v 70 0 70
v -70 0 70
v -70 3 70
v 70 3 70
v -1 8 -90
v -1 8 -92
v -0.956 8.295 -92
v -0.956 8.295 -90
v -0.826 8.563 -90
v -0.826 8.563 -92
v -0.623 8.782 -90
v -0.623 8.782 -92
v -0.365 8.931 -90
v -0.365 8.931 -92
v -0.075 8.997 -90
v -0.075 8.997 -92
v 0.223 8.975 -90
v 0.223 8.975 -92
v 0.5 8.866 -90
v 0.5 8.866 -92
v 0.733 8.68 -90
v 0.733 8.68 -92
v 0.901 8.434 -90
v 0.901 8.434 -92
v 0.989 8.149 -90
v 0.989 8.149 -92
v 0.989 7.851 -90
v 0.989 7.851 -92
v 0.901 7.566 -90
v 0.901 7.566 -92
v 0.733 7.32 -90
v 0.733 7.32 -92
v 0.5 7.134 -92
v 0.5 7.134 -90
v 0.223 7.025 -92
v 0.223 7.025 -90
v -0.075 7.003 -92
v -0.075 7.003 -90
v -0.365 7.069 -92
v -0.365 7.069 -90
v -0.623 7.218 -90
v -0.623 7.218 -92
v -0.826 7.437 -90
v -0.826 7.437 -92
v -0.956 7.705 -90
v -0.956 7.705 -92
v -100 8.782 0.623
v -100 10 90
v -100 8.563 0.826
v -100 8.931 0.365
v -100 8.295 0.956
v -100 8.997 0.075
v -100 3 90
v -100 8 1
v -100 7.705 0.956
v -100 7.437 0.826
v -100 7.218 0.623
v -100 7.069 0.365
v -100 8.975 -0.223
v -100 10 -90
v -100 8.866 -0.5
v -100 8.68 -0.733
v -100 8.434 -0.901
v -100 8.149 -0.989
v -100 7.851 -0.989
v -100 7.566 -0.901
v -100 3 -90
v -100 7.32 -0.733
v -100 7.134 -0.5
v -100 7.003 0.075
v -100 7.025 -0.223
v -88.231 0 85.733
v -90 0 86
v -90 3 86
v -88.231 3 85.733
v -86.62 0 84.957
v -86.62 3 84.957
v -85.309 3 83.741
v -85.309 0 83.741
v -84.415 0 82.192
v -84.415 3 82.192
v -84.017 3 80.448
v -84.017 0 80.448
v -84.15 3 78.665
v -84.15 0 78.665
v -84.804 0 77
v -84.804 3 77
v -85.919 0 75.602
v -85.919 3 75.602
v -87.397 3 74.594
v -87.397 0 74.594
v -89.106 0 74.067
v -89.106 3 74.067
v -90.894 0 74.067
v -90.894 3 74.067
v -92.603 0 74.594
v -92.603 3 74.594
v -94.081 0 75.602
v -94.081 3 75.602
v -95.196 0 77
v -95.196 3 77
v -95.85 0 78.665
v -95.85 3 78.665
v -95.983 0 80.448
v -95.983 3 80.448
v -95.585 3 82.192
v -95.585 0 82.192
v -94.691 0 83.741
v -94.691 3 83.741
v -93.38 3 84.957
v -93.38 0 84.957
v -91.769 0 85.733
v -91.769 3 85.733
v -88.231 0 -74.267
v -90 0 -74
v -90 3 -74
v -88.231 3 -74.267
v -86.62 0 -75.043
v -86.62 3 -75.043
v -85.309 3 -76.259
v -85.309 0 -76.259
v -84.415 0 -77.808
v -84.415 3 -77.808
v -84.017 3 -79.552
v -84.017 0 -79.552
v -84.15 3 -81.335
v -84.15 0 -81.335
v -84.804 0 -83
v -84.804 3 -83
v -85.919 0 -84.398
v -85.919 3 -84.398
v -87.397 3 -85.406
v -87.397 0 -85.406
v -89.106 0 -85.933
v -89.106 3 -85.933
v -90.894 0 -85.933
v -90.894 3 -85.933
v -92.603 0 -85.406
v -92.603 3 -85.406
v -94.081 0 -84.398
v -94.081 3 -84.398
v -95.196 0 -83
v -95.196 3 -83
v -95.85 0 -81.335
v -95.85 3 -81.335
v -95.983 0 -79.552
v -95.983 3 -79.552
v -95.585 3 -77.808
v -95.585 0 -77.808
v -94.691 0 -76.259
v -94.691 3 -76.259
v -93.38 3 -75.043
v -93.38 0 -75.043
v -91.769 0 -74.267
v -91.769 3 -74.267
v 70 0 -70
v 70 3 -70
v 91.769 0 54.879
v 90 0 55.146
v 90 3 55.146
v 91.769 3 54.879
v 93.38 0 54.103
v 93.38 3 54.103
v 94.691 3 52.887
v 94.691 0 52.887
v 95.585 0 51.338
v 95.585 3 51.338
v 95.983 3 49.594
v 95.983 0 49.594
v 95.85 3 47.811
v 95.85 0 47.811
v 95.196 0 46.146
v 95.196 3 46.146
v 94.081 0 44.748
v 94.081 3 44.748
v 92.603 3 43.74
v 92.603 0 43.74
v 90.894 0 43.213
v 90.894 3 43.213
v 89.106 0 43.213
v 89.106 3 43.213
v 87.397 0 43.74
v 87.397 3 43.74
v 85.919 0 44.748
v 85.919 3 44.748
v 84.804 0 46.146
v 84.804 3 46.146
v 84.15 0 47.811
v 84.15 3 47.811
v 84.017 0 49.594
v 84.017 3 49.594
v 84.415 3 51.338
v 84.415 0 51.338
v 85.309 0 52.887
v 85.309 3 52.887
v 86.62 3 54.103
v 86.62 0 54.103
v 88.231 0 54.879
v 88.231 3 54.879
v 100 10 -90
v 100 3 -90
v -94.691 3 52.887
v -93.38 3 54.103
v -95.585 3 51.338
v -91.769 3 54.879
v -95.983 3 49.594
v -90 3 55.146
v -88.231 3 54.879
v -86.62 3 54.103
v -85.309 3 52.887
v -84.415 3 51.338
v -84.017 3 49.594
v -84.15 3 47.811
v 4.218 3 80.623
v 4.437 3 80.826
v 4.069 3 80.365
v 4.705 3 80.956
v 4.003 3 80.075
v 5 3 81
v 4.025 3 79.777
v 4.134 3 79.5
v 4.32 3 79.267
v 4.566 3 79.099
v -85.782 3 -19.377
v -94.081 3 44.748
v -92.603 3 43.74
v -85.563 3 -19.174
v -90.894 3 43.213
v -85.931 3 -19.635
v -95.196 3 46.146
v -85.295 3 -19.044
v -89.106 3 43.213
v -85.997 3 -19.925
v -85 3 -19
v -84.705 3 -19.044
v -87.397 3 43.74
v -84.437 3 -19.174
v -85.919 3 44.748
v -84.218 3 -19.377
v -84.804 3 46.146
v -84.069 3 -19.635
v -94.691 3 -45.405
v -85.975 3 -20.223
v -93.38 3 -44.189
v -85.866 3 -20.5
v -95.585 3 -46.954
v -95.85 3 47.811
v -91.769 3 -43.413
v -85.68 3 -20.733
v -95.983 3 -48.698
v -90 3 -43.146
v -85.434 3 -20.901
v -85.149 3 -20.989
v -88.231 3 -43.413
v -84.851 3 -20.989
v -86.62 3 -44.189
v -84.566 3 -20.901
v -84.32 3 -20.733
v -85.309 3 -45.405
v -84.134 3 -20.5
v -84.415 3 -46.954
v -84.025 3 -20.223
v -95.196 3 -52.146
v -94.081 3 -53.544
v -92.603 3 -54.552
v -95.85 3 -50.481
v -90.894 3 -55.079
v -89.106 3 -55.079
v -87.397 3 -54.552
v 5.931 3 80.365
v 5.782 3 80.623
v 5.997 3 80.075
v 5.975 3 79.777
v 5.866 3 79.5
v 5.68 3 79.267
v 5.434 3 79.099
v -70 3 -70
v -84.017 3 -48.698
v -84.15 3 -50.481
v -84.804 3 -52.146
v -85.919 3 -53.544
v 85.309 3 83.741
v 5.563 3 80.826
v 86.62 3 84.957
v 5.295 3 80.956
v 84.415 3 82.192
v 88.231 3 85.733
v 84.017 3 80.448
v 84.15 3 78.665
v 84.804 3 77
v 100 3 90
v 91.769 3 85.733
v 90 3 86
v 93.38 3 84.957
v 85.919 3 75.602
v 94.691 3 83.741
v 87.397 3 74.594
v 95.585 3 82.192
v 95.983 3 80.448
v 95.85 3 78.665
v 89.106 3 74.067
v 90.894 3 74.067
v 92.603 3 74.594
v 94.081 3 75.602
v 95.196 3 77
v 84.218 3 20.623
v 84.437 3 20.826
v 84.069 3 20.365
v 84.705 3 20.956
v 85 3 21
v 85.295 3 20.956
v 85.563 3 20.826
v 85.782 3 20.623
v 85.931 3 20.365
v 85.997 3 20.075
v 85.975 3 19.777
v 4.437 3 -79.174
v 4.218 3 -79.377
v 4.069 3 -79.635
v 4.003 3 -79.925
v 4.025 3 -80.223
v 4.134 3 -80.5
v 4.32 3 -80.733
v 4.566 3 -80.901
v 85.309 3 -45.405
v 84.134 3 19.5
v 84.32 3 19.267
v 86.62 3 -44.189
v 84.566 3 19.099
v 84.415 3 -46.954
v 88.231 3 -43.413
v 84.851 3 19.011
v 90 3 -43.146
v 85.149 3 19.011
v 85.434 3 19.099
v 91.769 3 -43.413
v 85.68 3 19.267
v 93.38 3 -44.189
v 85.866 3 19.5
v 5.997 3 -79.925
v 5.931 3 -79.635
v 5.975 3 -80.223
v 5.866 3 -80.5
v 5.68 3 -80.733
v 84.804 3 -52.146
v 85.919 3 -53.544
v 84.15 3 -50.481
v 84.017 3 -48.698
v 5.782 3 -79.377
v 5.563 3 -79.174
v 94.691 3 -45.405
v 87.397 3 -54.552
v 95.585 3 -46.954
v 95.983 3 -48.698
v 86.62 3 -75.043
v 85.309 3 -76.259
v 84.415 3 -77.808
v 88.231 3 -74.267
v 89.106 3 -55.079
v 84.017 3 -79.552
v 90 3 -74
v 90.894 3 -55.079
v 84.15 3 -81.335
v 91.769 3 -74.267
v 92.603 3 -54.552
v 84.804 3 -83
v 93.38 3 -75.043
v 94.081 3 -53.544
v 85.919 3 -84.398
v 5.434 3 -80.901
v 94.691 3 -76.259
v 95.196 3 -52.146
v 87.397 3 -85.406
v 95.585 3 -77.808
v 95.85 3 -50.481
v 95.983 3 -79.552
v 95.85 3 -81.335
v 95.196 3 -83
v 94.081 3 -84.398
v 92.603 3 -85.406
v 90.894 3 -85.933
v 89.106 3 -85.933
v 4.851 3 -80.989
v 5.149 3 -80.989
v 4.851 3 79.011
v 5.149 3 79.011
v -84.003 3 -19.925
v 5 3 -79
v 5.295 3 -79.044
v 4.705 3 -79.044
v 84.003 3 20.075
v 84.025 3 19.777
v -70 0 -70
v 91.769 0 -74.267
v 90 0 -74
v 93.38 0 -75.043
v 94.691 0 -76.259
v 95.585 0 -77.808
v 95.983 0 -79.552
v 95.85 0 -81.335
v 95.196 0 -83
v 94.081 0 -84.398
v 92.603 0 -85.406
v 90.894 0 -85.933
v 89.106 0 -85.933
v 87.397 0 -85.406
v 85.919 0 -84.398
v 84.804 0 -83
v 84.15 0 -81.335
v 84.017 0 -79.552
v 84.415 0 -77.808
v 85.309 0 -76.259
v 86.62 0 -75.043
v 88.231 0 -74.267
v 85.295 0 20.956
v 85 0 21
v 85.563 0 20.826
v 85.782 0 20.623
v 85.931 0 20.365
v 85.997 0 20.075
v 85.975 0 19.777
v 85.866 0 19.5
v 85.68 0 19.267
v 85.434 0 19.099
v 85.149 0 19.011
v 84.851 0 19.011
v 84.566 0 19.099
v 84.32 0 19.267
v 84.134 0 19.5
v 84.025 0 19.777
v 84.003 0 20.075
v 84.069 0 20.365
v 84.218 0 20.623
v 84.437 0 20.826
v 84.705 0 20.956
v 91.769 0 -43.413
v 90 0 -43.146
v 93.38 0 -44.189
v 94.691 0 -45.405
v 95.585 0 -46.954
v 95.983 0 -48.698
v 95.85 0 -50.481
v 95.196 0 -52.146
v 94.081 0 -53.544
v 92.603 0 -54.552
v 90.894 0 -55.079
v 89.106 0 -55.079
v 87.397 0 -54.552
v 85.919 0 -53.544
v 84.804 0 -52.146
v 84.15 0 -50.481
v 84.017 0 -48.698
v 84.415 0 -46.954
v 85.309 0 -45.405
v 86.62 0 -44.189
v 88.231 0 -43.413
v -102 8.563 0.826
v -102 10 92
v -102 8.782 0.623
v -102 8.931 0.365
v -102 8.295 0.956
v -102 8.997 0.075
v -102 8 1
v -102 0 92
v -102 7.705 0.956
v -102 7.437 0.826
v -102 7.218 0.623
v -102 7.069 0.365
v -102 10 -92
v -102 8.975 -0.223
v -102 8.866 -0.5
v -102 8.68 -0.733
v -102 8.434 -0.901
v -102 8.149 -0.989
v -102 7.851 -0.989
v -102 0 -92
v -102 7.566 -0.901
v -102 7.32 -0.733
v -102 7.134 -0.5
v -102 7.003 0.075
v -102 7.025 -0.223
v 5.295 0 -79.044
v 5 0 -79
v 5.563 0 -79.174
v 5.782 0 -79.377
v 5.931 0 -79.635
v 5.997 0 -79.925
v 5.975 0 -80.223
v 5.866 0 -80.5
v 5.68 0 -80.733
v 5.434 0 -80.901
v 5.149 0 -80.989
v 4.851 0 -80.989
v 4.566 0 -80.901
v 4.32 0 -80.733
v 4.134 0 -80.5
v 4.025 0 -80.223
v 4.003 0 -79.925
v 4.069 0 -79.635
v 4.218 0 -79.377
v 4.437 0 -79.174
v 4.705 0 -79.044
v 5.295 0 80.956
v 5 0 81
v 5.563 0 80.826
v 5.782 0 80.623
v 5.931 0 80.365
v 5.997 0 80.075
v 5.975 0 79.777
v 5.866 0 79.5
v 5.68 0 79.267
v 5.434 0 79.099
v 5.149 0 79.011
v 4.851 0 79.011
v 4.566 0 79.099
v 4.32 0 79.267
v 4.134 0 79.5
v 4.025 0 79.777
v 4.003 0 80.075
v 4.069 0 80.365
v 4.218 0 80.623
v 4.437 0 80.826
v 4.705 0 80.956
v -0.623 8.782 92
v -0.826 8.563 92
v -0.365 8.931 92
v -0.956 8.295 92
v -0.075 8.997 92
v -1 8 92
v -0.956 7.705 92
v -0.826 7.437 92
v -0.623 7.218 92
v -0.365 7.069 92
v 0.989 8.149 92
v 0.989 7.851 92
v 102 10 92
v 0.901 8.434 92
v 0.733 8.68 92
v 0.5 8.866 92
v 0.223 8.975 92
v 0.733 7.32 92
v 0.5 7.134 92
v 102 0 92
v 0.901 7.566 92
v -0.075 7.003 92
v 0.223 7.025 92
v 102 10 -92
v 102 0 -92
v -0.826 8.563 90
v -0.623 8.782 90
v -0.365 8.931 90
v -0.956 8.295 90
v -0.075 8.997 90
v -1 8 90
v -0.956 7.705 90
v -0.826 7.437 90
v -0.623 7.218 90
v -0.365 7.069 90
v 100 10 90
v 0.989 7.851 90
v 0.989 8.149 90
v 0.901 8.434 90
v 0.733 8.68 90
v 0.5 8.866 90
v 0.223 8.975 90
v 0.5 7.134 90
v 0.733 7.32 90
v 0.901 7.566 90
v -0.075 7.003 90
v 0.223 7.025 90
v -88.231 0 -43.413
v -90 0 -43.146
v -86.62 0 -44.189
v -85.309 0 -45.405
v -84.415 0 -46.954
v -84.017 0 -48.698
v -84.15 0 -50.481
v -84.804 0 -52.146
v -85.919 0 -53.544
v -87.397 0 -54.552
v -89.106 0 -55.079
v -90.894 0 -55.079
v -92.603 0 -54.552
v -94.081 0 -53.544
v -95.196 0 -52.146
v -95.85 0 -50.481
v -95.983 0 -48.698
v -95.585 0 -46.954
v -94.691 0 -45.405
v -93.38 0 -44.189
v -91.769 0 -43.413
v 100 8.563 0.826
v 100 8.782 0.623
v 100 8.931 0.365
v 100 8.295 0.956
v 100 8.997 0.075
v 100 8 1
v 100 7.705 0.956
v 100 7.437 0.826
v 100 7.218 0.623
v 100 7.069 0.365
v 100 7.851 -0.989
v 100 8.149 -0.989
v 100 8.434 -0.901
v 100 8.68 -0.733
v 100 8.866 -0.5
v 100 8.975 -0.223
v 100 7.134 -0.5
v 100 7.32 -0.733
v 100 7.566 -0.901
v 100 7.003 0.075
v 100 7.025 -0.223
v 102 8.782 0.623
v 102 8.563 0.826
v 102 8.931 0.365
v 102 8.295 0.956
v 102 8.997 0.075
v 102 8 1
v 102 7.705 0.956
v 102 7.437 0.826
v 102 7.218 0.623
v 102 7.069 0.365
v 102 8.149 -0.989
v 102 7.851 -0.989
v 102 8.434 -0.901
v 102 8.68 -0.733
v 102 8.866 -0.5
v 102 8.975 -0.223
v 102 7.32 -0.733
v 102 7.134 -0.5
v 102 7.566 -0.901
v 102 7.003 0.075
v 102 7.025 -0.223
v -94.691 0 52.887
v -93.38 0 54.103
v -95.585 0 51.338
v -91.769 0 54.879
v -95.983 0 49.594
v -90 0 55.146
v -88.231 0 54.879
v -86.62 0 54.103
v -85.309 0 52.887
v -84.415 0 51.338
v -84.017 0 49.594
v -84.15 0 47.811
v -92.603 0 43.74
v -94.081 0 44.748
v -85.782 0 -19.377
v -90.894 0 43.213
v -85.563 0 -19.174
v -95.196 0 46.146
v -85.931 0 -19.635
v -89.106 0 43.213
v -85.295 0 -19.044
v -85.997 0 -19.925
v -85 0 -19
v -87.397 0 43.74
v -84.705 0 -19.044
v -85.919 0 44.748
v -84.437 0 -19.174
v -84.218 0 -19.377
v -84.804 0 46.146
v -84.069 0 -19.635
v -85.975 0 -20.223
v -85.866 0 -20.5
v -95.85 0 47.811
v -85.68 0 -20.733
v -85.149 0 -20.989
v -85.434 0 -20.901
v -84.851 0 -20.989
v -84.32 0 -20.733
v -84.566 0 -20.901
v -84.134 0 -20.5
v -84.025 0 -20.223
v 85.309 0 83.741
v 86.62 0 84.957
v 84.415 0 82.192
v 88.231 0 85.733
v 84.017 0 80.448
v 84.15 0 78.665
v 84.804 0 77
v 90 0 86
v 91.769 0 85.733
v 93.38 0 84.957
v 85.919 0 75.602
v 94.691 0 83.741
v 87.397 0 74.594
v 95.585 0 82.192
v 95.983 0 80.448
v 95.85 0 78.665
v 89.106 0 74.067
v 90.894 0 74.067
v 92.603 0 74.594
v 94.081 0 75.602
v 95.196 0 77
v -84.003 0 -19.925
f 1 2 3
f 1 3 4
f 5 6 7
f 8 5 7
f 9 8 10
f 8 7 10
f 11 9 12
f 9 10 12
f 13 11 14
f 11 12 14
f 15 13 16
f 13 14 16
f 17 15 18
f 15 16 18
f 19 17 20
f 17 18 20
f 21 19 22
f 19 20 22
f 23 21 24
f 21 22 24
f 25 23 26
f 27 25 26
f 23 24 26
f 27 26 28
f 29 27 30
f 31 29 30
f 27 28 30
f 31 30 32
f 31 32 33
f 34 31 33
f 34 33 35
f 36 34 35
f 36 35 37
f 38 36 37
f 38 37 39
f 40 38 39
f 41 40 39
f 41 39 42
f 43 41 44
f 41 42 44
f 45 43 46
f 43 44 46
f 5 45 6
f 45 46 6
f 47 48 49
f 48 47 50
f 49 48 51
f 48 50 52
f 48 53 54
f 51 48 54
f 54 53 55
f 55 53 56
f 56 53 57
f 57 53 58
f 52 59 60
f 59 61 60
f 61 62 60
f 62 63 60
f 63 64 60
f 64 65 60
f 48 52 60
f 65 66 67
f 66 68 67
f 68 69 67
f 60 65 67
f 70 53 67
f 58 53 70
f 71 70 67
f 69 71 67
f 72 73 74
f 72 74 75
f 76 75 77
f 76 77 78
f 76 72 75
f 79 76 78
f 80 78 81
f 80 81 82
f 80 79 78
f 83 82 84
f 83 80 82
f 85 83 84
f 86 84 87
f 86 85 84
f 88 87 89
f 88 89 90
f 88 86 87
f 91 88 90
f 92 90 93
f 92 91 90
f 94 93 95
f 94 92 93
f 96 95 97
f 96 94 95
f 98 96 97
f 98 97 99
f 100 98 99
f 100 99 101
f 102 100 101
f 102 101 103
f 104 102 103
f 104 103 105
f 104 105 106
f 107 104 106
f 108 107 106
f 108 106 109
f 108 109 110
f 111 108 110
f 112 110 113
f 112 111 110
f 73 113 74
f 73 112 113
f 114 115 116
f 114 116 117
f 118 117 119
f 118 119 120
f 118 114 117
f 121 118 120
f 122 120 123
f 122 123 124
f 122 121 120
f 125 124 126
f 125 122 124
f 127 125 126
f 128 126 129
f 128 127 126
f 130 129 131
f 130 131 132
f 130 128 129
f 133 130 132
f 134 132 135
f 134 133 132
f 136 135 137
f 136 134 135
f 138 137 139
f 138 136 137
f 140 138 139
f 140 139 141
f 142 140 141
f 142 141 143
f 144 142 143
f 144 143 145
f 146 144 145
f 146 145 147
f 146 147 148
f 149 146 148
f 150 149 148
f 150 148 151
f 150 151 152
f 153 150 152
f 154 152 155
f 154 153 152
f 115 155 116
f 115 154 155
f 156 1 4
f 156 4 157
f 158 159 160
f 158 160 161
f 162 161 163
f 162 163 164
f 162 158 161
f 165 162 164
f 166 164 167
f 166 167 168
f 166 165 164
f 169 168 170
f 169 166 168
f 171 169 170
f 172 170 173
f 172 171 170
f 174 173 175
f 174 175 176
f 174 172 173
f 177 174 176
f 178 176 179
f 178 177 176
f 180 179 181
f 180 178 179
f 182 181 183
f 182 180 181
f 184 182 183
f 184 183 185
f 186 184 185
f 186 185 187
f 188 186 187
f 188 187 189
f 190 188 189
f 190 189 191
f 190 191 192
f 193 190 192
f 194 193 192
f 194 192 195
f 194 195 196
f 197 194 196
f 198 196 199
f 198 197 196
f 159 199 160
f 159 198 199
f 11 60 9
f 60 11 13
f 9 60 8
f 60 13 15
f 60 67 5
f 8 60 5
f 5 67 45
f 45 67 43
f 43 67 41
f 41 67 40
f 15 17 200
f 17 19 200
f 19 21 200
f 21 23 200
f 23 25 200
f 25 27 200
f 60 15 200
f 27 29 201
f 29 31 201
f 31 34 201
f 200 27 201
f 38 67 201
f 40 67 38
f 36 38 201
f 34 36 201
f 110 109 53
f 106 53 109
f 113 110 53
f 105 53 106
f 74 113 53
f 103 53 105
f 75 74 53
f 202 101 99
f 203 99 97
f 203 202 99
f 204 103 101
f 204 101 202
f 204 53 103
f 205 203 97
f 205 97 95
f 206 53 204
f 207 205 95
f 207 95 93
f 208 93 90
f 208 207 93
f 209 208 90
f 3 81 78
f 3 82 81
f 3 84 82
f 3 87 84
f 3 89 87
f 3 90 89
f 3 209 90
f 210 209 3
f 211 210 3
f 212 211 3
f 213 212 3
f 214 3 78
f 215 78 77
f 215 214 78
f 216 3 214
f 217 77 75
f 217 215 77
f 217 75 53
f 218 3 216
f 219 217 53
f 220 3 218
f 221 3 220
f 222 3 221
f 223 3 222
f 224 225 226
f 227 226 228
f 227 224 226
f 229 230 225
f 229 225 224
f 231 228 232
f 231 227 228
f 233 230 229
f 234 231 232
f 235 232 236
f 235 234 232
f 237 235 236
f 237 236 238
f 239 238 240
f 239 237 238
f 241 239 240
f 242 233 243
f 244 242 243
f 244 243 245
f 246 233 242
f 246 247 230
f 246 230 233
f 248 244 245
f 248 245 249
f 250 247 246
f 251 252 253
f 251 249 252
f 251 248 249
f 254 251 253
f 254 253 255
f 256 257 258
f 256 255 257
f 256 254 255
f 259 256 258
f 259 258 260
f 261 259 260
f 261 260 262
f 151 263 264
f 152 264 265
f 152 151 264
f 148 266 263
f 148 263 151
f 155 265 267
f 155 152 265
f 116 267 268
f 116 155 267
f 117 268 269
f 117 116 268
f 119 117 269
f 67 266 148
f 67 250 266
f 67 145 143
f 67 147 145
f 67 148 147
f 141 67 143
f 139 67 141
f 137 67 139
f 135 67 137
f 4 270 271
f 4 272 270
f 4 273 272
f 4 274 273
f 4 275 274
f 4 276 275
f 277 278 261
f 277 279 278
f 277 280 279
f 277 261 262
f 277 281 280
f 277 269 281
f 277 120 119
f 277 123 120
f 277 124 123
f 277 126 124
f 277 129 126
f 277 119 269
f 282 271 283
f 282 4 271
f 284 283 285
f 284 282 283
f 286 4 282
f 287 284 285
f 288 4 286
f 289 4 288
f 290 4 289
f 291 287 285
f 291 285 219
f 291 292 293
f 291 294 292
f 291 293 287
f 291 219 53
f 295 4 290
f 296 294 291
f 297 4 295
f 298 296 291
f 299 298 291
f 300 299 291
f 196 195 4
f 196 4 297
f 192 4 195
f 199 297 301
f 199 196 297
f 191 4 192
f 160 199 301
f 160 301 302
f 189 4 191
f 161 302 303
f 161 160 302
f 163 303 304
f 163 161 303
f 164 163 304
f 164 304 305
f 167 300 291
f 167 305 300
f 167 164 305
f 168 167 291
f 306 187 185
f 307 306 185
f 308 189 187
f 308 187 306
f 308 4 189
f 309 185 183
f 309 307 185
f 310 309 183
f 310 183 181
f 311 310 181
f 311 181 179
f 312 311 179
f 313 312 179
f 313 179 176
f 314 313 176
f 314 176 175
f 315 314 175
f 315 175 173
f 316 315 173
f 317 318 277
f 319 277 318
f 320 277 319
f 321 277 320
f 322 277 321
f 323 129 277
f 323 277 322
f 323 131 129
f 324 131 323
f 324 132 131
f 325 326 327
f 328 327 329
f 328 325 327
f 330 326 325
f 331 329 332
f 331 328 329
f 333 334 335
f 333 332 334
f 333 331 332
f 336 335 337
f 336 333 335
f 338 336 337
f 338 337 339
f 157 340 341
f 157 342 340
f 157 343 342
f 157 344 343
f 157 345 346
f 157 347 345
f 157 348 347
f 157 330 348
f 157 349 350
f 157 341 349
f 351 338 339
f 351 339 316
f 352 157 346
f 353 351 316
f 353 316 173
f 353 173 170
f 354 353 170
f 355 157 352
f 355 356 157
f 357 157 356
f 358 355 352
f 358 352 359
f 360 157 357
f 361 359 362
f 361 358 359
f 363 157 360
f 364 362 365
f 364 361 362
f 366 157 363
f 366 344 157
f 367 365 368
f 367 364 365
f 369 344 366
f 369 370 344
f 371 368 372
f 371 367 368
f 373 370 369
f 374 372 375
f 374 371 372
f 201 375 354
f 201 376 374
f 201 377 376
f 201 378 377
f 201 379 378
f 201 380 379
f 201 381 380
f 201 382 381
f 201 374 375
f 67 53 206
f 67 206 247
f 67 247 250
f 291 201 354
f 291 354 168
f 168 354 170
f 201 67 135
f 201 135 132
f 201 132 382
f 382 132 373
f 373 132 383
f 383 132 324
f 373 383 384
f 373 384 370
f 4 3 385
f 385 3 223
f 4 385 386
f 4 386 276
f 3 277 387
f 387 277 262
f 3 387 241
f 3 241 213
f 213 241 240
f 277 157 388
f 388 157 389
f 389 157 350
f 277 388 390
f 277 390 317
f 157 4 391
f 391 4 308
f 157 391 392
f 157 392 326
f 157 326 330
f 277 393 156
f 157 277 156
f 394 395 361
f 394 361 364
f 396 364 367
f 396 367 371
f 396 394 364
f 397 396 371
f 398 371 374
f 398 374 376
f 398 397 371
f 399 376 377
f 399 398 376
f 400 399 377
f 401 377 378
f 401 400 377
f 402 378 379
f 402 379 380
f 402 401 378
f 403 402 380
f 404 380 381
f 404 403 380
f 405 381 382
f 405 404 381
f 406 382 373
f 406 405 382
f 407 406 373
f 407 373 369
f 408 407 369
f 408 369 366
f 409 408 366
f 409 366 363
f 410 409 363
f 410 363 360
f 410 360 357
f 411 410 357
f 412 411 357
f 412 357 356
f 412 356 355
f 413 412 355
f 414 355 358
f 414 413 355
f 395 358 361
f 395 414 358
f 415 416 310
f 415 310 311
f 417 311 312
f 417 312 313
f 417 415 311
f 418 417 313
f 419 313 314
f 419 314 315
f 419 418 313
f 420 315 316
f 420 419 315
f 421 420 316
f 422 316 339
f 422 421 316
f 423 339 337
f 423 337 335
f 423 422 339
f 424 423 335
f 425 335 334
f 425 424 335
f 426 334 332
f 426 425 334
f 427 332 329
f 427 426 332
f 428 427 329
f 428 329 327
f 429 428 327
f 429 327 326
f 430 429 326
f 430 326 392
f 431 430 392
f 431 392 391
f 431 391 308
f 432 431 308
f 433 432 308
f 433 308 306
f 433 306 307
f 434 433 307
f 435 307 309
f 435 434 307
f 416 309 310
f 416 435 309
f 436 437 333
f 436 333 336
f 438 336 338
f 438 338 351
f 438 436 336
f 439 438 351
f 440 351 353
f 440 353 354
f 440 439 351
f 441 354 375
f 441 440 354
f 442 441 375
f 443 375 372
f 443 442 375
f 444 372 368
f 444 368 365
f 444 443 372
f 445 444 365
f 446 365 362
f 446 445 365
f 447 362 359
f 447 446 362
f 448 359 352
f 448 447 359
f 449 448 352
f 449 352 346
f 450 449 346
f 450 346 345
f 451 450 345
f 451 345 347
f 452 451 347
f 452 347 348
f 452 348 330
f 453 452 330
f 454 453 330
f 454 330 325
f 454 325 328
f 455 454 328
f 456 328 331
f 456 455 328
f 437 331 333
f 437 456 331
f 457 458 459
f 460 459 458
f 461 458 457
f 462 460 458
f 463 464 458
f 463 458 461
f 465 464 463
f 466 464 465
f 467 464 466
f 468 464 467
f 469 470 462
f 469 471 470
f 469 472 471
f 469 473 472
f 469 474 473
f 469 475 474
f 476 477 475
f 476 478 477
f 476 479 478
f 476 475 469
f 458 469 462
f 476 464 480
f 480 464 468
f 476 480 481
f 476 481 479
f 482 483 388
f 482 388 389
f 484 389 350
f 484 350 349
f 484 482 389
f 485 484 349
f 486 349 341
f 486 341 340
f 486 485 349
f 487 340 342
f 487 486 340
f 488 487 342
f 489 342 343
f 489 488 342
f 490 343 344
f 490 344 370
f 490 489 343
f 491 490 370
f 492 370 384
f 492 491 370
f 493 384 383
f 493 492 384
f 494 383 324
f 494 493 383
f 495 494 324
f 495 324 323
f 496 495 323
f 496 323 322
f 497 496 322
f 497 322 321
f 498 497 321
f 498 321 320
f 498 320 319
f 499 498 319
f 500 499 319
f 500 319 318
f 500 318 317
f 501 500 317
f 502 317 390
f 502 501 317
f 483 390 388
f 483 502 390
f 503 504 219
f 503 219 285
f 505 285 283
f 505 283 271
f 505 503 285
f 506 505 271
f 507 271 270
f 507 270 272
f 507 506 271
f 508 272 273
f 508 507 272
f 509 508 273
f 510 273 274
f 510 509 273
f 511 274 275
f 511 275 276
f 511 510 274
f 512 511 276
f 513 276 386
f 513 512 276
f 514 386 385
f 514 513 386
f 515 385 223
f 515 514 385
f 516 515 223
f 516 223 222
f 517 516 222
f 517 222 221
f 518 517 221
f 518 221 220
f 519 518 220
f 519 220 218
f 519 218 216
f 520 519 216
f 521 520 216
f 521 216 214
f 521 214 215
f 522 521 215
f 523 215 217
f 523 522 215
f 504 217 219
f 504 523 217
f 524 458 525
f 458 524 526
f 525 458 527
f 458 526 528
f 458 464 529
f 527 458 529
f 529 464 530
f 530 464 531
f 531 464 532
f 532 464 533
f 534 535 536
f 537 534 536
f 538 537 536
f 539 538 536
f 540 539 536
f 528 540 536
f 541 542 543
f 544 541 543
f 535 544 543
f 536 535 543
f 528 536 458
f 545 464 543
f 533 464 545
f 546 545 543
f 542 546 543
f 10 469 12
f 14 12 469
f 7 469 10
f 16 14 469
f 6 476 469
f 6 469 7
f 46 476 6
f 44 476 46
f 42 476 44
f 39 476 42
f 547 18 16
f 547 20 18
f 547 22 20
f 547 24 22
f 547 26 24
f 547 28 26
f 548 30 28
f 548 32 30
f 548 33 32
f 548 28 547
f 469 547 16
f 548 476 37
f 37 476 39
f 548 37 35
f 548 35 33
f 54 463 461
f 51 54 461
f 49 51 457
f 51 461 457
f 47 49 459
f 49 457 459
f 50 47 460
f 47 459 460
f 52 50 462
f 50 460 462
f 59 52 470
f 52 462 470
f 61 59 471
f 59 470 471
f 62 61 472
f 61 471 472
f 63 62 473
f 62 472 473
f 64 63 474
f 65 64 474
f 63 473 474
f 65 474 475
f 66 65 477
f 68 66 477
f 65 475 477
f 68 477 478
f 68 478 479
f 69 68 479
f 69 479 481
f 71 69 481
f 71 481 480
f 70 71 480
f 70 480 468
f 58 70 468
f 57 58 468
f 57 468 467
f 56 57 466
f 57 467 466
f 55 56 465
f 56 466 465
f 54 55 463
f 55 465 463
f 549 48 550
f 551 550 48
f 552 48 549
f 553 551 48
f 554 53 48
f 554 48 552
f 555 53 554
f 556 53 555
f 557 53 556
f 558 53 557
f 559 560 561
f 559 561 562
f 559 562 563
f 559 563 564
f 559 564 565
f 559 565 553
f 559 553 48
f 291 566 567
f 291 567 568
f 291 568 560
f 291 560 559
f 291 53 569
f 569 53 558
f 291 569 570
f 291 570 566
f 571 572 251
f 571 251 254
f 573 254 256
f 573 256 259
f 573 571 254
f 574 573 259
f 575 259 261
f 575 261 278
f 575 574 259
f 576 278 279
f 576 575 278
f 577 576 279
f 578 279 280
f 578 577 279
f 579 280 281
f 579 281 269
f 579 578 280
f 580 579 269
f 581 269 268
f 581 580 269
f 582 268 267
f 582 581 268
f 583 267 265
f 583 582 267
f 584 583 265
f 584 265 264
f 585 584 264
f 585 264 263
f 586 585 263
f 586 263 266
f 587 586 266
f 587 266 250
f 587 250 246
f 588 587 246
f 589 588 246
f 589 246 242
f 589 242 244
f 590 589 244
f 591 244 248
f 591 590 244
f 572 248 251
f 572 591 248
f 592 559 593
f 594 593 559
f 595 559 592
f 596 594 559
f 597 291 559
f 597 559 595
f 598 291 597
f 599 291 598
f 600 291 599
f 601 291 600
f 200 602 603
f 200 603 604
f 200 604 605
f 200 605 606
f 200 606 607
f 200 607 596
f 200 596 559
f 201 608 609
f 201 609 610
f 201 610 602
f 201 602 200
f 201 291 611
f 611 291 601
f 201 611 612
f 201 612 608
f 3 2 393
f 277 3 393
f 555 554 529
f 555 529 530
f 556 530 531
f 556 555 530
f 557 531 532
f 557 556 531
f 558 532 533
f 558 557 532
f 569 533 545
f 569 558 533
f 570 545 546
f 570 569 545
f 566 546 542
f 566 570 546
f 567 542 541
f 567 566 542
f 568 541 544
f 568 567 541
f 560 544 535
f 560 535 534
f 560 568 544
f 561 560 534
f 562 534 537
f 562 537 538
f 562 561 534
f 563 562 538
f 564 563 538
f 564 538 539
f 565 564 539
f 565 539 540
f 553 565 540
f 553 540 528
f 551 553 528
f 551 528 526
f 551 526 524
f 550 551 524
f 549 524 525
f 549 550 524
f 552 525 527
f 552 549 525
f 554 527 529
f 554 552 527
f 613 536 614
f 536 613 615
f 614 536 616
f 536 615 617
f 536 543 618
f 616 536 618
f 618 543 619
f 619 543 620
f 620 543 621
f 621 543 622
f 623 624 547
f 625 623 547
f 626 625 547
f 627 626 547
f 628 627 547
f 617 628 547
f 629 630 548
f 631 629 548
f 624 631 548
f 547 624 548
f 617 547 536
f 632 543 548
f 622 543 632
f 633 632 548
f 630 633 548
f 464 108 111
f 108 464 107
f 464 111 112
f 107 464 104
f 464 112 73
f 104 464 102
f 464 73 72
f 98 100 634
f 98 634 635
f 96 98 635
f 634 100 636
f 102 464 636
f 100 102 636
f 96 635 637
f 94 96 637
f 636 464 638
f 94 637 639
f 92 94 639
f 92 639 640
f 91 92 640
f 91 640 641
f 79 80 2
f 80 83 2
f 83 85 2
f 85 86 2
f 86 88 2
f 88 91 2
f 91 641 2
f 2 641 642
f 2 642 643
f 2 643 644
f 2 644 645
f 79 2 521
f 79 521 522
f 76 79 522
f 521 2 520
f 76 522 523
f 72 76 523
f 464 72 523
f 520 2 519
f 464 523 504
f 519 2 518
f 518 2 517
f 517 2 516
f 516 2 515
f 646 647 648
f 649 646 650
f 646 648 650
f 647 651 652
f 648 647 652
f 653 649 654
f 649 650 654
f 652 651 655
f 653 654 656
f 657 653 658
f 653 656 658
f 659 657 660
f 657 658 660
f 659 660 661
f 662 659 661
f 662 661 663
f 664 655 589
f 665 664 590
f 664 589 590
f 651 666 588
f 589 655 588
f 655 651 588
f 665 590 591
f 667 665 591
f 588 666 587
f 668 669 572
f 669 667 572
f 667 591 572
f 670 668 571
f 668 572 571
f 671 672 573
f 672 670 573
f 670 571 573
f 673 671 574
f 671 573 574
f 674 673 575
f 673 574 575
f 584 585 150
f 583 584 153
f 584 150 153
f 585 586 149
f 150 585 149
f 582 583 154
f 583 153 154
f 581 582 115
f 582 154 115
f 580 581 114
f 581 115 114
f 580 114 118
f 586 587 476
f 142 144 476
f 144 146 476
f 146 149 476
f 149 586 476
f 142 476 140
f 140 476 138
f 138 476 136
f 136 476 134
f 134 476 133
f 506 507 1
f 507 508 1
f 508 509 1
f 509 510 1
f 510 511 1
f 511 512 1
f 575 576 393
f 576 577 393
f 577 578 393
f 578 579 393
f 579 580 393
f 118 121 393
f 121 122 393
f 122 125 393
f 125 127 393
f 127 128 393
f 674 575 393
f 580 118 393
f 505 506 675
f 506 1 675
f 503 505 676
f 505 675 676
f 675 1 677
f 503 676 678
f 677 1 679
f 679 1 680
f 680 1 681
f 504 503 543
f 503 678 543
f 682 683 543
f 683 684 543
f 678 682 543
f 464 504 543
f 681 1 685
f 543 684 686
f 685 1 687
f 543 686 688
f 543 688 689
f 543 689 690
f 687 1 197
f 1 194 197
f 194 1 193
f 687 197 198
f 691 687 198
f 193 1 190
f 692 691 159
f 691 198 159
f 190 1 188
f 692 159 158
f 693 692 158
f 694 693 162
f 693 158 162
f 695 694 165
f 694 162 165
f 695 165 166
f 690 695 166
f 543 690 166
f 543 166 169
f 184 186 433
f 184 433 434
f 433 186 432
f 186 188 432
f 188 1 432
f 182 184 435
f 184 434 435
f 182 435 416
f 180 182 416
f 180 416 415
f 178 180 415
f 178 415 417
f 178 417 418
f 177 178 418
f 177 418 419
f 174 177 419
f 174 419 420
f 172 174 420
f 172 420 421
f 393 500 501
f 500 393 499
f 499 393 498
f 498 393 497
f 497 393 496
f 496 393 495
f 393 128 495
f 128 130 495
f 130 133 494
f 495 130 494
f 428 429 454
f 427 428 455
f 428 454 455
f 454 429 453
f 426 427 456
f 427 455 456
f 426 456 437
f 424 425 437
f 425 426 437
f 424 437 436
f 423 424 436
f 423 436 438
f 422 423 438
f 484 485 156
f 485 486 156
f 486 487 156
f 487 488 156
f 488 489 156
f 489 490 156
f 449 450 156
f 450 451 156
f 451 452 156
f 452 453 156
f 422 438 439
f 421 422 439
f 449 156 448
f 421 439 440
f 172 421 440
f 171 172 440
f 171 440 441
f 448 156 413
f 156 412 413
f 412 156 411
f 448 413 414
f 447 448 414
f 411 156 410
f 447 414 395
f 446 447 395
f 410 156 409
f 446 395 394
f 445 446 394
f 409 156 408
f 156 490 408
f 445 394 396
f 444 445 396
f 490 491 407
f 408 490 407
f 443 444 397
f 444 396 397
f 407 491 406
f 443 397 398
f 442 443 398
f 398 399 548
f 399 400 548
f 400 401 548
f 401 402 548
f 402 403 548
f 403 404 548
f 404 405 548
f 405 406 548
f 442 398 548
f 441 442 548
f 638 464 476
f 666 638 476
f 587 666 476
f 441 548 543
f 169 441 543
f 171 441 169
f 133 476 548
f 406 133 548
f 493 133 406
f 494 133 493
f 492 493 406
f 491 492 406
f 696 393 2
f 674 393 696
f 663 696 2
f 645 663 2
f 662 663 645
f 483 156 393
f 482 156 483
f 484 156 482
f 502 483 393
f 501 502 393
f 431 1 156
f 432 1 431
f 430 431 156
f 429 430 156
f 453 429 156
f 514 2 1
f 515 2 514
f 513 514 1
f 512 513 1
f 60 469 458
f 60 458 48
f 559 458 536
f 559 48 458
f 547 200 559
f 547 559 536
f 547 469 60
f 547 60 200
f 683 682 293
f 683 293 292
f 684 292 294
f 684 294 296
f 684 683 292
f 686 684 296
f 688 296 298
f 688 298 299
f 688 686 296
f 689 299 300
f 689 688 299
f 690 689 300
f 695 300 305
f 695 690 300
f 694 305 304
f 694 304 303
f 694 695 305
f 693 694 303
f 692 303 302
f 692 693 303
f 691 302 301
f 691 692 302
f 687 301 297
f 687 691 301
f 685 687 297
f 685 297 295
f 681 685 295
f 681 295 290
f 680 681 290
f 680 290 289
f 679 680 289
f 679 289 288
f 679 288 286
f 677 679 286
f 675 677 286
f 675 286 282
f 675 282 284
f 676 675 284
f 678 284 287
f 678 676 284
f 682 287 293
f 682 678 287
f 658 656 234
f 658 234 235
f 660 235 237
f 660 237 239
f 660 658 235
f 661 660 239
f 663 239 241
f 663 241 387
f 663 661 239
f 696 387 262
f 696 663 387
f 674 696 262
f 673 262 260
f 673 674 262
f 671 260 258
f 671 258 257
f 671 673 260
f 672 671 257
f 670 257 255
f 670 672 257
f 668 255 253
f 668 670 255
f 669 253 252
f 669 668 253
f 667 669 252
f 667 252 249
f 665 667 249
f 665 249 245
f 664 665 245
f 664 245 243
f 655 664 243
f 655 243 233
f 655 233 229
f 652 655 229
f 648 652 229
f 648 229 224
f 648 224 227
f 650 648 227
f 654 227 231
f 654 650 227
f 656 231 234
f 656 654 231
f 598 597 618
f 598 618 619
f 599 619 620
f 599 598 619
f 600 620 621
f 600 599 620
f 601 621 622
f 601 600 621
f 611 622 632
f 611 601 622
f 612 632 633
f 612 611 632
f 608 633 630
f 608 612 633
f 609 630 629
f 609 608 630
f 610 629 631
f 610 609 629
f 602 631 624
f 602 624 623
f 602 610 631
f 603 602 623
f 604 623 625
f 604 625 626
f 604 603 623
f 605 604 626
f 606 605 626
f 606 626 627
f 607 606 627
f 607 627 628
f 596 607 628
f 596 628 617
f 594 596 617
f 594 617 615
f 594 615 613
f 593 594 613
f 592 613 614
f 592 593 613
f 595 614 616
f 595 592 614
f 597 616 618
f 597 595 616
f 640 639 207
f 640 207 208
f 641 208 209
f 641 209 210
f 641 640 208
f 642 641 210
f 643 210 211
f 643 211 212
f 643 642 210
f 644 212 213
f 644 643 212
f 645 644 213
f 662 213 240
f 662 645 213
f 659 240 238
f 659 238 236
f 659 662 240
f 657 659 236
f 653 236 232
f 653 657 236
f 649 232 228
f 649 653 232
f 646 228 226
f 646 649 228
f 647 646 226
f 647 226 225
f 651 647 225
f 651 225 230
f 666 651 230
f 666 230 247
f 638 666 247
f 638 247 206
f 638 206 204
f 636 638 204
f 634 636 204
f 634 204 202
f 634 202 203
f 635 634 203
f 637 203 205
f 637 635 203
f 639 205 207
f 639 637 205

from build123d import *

# Parameters (mm, degrees)
SKETCH1_W           = 200
SKETCH1_H           = 180
SKETCH1_R           = 6
SKETCH1_R_2         = 1
SKETCH1_W_2         = 140
SKETCH1_H_2         = 140
BOSS_EXTRUDE4_DEPTH = 3
SKETCH1_3_W         = 204
SKETCH1_3_H         = 184
SKETCH1_3_W_2       = 200
SKETCH1_3_H_2       = 180
BOSS_EXTRUDE5_DEPTH = 10
SKETCH4_R           = 1
CUT_EXTRUDE1_DEPTH  = 2
SKETCH7_R           = 1
CUT_EXTRUDE2_DEPTH  = 2
CUT_EXTRUDE3_START  = -2
SKETCH6_R           = 1
CUT_EXTRUDE3_DEPTH  = 2
CUT_EXTRUDE4_START  = -2
SKETCH5_R           = 1
CUT_EXTRUDE4_DEPTH  = 2


with BuildPart() as part:
    # Sketch1 → Boss-Extrude4 (new body)
    with BuildSketch(Plane(origin=(0, 0, 0), x_dir=(1, 0, 0), z_dir=(0, 1, 0))):
        Rectangle(SKETCH1_W, SKETCH1_H)
        with Locations((-90, -80)):
            Circle(SKETCH1_R, mode=Mode.SUBTRACT)
        with Locations((-90, -49.146026748)):
            Circle(SKETCH1_R, mode=Mode.SUBTRACT)
        with Locations((5, -80)):
            Circle(SKETCH1_R_2, mode=Mode.SUBTRACT)
        with Locations((90, -80)):
            Circle(SKETCH1_R, mode=Mode.SUBTRACT)
        with Locations((90, -49.146026748)):
            Circle(SKETCH1_R, mode=Mode.SUBTRACT)
        with Locations((85, -20)):
            Circle(SKETCH1_R_2, mode=Mode.SUBTRACT)
        with Locations((-85, 20)):
            Circle(SKETCH1_R_2, mode=Mode.SUBTRACT)
        Rectangle(SKETCH1_W_2, SKETCH1_H_2, mode=Mode.SUBTRACT)
        with Locations((-90, 49.146026748)):
            Circle(SKETCH1_R, mode=Mode.SUBTRACT)
        with Locations((-90, 80)):
            Circle(SKETCH1_R, mode=Mode.SUBTRACT)
        with Locations((5, 80)):
            Circle(SKETCH1_R_2, mode=Mode.SUBTRACT)
        with Locations((90, 49.146026748)):
            Circle(SKETCH1_R, mode=Mode.SUBTRACT)
        with Locations((90, 80)):
            Circle(SKETCH1_R, mode=Mode.SUBTRACT)
    extrude(amount=BOSS_EXTRUDE4_DEPTH)

    # Sketch1<3> → Boss-Extrude5 (add)
    with BuildSketch(Plane(origin=(0, 0, 0), x_dir=(1, 0, 0), z_dir=(0, 1, 0))):
        Rectangle(SKETCH1_3_W, SKETCH1_3_H)
        Rectangle(SKETCH1_3_W_2, SKETCH1_3_H_2, mode=Mode.SUBTRACT)
    extrude(amount=BOSS_EXTRUDE5_DEPTH)

    # Sketch4 → Cut-Extrude1 (cut)
    with BuildSketch(Plane.ZY.offset(102)):
        with Locations((0, 8)):
            Circle(SKETCH4_R)
    extrude(amount=-CUT_EXTRUDE1_DEPTH, mode=Mode.SUBTRACT)

    # Sketch7 → Cut-Extrude2 (cut)
    with BuildSketch(Plane(origin=(0, 0, -92), x_dir=(-1, 0, 0), z_dir=(0, 0, -1))):
        with Locations((0, 8)):
            Circle(SKETCH7_R)
    extrude(amount=-CUT_EXTRUDE2_DEPTH, mode=Mode.SUBTRACT)

    # Sketch6 → Cut-Extrude3 (cut)
    with BuildSketch(Plane(origin=(102, 0, 0), x_dir=(0, 0, -1), z_dir=(1, 0, 0)).offset(CUT_EXTRUDE3_START)):
        with Locations((0, 8)):
            Circle(SKETCH6_R)
    extrude(amount=CUT_EXTRUDE3_DEPTH, mode=Mode.SUBTRACT)

    # Sketch5 → Cut-Extrude4 (cut)
    with BuildSketch(Plane.XY.offset(92).offset(CUT_EXTRUDE4_START)):
        with Locations((0, 8)):
            Circle(SKETCH5_R)
    extrude(amount=CUT_EXTRUDE4_DEPTH, mode=Mode.SUBTRACT)


solid = part.part
